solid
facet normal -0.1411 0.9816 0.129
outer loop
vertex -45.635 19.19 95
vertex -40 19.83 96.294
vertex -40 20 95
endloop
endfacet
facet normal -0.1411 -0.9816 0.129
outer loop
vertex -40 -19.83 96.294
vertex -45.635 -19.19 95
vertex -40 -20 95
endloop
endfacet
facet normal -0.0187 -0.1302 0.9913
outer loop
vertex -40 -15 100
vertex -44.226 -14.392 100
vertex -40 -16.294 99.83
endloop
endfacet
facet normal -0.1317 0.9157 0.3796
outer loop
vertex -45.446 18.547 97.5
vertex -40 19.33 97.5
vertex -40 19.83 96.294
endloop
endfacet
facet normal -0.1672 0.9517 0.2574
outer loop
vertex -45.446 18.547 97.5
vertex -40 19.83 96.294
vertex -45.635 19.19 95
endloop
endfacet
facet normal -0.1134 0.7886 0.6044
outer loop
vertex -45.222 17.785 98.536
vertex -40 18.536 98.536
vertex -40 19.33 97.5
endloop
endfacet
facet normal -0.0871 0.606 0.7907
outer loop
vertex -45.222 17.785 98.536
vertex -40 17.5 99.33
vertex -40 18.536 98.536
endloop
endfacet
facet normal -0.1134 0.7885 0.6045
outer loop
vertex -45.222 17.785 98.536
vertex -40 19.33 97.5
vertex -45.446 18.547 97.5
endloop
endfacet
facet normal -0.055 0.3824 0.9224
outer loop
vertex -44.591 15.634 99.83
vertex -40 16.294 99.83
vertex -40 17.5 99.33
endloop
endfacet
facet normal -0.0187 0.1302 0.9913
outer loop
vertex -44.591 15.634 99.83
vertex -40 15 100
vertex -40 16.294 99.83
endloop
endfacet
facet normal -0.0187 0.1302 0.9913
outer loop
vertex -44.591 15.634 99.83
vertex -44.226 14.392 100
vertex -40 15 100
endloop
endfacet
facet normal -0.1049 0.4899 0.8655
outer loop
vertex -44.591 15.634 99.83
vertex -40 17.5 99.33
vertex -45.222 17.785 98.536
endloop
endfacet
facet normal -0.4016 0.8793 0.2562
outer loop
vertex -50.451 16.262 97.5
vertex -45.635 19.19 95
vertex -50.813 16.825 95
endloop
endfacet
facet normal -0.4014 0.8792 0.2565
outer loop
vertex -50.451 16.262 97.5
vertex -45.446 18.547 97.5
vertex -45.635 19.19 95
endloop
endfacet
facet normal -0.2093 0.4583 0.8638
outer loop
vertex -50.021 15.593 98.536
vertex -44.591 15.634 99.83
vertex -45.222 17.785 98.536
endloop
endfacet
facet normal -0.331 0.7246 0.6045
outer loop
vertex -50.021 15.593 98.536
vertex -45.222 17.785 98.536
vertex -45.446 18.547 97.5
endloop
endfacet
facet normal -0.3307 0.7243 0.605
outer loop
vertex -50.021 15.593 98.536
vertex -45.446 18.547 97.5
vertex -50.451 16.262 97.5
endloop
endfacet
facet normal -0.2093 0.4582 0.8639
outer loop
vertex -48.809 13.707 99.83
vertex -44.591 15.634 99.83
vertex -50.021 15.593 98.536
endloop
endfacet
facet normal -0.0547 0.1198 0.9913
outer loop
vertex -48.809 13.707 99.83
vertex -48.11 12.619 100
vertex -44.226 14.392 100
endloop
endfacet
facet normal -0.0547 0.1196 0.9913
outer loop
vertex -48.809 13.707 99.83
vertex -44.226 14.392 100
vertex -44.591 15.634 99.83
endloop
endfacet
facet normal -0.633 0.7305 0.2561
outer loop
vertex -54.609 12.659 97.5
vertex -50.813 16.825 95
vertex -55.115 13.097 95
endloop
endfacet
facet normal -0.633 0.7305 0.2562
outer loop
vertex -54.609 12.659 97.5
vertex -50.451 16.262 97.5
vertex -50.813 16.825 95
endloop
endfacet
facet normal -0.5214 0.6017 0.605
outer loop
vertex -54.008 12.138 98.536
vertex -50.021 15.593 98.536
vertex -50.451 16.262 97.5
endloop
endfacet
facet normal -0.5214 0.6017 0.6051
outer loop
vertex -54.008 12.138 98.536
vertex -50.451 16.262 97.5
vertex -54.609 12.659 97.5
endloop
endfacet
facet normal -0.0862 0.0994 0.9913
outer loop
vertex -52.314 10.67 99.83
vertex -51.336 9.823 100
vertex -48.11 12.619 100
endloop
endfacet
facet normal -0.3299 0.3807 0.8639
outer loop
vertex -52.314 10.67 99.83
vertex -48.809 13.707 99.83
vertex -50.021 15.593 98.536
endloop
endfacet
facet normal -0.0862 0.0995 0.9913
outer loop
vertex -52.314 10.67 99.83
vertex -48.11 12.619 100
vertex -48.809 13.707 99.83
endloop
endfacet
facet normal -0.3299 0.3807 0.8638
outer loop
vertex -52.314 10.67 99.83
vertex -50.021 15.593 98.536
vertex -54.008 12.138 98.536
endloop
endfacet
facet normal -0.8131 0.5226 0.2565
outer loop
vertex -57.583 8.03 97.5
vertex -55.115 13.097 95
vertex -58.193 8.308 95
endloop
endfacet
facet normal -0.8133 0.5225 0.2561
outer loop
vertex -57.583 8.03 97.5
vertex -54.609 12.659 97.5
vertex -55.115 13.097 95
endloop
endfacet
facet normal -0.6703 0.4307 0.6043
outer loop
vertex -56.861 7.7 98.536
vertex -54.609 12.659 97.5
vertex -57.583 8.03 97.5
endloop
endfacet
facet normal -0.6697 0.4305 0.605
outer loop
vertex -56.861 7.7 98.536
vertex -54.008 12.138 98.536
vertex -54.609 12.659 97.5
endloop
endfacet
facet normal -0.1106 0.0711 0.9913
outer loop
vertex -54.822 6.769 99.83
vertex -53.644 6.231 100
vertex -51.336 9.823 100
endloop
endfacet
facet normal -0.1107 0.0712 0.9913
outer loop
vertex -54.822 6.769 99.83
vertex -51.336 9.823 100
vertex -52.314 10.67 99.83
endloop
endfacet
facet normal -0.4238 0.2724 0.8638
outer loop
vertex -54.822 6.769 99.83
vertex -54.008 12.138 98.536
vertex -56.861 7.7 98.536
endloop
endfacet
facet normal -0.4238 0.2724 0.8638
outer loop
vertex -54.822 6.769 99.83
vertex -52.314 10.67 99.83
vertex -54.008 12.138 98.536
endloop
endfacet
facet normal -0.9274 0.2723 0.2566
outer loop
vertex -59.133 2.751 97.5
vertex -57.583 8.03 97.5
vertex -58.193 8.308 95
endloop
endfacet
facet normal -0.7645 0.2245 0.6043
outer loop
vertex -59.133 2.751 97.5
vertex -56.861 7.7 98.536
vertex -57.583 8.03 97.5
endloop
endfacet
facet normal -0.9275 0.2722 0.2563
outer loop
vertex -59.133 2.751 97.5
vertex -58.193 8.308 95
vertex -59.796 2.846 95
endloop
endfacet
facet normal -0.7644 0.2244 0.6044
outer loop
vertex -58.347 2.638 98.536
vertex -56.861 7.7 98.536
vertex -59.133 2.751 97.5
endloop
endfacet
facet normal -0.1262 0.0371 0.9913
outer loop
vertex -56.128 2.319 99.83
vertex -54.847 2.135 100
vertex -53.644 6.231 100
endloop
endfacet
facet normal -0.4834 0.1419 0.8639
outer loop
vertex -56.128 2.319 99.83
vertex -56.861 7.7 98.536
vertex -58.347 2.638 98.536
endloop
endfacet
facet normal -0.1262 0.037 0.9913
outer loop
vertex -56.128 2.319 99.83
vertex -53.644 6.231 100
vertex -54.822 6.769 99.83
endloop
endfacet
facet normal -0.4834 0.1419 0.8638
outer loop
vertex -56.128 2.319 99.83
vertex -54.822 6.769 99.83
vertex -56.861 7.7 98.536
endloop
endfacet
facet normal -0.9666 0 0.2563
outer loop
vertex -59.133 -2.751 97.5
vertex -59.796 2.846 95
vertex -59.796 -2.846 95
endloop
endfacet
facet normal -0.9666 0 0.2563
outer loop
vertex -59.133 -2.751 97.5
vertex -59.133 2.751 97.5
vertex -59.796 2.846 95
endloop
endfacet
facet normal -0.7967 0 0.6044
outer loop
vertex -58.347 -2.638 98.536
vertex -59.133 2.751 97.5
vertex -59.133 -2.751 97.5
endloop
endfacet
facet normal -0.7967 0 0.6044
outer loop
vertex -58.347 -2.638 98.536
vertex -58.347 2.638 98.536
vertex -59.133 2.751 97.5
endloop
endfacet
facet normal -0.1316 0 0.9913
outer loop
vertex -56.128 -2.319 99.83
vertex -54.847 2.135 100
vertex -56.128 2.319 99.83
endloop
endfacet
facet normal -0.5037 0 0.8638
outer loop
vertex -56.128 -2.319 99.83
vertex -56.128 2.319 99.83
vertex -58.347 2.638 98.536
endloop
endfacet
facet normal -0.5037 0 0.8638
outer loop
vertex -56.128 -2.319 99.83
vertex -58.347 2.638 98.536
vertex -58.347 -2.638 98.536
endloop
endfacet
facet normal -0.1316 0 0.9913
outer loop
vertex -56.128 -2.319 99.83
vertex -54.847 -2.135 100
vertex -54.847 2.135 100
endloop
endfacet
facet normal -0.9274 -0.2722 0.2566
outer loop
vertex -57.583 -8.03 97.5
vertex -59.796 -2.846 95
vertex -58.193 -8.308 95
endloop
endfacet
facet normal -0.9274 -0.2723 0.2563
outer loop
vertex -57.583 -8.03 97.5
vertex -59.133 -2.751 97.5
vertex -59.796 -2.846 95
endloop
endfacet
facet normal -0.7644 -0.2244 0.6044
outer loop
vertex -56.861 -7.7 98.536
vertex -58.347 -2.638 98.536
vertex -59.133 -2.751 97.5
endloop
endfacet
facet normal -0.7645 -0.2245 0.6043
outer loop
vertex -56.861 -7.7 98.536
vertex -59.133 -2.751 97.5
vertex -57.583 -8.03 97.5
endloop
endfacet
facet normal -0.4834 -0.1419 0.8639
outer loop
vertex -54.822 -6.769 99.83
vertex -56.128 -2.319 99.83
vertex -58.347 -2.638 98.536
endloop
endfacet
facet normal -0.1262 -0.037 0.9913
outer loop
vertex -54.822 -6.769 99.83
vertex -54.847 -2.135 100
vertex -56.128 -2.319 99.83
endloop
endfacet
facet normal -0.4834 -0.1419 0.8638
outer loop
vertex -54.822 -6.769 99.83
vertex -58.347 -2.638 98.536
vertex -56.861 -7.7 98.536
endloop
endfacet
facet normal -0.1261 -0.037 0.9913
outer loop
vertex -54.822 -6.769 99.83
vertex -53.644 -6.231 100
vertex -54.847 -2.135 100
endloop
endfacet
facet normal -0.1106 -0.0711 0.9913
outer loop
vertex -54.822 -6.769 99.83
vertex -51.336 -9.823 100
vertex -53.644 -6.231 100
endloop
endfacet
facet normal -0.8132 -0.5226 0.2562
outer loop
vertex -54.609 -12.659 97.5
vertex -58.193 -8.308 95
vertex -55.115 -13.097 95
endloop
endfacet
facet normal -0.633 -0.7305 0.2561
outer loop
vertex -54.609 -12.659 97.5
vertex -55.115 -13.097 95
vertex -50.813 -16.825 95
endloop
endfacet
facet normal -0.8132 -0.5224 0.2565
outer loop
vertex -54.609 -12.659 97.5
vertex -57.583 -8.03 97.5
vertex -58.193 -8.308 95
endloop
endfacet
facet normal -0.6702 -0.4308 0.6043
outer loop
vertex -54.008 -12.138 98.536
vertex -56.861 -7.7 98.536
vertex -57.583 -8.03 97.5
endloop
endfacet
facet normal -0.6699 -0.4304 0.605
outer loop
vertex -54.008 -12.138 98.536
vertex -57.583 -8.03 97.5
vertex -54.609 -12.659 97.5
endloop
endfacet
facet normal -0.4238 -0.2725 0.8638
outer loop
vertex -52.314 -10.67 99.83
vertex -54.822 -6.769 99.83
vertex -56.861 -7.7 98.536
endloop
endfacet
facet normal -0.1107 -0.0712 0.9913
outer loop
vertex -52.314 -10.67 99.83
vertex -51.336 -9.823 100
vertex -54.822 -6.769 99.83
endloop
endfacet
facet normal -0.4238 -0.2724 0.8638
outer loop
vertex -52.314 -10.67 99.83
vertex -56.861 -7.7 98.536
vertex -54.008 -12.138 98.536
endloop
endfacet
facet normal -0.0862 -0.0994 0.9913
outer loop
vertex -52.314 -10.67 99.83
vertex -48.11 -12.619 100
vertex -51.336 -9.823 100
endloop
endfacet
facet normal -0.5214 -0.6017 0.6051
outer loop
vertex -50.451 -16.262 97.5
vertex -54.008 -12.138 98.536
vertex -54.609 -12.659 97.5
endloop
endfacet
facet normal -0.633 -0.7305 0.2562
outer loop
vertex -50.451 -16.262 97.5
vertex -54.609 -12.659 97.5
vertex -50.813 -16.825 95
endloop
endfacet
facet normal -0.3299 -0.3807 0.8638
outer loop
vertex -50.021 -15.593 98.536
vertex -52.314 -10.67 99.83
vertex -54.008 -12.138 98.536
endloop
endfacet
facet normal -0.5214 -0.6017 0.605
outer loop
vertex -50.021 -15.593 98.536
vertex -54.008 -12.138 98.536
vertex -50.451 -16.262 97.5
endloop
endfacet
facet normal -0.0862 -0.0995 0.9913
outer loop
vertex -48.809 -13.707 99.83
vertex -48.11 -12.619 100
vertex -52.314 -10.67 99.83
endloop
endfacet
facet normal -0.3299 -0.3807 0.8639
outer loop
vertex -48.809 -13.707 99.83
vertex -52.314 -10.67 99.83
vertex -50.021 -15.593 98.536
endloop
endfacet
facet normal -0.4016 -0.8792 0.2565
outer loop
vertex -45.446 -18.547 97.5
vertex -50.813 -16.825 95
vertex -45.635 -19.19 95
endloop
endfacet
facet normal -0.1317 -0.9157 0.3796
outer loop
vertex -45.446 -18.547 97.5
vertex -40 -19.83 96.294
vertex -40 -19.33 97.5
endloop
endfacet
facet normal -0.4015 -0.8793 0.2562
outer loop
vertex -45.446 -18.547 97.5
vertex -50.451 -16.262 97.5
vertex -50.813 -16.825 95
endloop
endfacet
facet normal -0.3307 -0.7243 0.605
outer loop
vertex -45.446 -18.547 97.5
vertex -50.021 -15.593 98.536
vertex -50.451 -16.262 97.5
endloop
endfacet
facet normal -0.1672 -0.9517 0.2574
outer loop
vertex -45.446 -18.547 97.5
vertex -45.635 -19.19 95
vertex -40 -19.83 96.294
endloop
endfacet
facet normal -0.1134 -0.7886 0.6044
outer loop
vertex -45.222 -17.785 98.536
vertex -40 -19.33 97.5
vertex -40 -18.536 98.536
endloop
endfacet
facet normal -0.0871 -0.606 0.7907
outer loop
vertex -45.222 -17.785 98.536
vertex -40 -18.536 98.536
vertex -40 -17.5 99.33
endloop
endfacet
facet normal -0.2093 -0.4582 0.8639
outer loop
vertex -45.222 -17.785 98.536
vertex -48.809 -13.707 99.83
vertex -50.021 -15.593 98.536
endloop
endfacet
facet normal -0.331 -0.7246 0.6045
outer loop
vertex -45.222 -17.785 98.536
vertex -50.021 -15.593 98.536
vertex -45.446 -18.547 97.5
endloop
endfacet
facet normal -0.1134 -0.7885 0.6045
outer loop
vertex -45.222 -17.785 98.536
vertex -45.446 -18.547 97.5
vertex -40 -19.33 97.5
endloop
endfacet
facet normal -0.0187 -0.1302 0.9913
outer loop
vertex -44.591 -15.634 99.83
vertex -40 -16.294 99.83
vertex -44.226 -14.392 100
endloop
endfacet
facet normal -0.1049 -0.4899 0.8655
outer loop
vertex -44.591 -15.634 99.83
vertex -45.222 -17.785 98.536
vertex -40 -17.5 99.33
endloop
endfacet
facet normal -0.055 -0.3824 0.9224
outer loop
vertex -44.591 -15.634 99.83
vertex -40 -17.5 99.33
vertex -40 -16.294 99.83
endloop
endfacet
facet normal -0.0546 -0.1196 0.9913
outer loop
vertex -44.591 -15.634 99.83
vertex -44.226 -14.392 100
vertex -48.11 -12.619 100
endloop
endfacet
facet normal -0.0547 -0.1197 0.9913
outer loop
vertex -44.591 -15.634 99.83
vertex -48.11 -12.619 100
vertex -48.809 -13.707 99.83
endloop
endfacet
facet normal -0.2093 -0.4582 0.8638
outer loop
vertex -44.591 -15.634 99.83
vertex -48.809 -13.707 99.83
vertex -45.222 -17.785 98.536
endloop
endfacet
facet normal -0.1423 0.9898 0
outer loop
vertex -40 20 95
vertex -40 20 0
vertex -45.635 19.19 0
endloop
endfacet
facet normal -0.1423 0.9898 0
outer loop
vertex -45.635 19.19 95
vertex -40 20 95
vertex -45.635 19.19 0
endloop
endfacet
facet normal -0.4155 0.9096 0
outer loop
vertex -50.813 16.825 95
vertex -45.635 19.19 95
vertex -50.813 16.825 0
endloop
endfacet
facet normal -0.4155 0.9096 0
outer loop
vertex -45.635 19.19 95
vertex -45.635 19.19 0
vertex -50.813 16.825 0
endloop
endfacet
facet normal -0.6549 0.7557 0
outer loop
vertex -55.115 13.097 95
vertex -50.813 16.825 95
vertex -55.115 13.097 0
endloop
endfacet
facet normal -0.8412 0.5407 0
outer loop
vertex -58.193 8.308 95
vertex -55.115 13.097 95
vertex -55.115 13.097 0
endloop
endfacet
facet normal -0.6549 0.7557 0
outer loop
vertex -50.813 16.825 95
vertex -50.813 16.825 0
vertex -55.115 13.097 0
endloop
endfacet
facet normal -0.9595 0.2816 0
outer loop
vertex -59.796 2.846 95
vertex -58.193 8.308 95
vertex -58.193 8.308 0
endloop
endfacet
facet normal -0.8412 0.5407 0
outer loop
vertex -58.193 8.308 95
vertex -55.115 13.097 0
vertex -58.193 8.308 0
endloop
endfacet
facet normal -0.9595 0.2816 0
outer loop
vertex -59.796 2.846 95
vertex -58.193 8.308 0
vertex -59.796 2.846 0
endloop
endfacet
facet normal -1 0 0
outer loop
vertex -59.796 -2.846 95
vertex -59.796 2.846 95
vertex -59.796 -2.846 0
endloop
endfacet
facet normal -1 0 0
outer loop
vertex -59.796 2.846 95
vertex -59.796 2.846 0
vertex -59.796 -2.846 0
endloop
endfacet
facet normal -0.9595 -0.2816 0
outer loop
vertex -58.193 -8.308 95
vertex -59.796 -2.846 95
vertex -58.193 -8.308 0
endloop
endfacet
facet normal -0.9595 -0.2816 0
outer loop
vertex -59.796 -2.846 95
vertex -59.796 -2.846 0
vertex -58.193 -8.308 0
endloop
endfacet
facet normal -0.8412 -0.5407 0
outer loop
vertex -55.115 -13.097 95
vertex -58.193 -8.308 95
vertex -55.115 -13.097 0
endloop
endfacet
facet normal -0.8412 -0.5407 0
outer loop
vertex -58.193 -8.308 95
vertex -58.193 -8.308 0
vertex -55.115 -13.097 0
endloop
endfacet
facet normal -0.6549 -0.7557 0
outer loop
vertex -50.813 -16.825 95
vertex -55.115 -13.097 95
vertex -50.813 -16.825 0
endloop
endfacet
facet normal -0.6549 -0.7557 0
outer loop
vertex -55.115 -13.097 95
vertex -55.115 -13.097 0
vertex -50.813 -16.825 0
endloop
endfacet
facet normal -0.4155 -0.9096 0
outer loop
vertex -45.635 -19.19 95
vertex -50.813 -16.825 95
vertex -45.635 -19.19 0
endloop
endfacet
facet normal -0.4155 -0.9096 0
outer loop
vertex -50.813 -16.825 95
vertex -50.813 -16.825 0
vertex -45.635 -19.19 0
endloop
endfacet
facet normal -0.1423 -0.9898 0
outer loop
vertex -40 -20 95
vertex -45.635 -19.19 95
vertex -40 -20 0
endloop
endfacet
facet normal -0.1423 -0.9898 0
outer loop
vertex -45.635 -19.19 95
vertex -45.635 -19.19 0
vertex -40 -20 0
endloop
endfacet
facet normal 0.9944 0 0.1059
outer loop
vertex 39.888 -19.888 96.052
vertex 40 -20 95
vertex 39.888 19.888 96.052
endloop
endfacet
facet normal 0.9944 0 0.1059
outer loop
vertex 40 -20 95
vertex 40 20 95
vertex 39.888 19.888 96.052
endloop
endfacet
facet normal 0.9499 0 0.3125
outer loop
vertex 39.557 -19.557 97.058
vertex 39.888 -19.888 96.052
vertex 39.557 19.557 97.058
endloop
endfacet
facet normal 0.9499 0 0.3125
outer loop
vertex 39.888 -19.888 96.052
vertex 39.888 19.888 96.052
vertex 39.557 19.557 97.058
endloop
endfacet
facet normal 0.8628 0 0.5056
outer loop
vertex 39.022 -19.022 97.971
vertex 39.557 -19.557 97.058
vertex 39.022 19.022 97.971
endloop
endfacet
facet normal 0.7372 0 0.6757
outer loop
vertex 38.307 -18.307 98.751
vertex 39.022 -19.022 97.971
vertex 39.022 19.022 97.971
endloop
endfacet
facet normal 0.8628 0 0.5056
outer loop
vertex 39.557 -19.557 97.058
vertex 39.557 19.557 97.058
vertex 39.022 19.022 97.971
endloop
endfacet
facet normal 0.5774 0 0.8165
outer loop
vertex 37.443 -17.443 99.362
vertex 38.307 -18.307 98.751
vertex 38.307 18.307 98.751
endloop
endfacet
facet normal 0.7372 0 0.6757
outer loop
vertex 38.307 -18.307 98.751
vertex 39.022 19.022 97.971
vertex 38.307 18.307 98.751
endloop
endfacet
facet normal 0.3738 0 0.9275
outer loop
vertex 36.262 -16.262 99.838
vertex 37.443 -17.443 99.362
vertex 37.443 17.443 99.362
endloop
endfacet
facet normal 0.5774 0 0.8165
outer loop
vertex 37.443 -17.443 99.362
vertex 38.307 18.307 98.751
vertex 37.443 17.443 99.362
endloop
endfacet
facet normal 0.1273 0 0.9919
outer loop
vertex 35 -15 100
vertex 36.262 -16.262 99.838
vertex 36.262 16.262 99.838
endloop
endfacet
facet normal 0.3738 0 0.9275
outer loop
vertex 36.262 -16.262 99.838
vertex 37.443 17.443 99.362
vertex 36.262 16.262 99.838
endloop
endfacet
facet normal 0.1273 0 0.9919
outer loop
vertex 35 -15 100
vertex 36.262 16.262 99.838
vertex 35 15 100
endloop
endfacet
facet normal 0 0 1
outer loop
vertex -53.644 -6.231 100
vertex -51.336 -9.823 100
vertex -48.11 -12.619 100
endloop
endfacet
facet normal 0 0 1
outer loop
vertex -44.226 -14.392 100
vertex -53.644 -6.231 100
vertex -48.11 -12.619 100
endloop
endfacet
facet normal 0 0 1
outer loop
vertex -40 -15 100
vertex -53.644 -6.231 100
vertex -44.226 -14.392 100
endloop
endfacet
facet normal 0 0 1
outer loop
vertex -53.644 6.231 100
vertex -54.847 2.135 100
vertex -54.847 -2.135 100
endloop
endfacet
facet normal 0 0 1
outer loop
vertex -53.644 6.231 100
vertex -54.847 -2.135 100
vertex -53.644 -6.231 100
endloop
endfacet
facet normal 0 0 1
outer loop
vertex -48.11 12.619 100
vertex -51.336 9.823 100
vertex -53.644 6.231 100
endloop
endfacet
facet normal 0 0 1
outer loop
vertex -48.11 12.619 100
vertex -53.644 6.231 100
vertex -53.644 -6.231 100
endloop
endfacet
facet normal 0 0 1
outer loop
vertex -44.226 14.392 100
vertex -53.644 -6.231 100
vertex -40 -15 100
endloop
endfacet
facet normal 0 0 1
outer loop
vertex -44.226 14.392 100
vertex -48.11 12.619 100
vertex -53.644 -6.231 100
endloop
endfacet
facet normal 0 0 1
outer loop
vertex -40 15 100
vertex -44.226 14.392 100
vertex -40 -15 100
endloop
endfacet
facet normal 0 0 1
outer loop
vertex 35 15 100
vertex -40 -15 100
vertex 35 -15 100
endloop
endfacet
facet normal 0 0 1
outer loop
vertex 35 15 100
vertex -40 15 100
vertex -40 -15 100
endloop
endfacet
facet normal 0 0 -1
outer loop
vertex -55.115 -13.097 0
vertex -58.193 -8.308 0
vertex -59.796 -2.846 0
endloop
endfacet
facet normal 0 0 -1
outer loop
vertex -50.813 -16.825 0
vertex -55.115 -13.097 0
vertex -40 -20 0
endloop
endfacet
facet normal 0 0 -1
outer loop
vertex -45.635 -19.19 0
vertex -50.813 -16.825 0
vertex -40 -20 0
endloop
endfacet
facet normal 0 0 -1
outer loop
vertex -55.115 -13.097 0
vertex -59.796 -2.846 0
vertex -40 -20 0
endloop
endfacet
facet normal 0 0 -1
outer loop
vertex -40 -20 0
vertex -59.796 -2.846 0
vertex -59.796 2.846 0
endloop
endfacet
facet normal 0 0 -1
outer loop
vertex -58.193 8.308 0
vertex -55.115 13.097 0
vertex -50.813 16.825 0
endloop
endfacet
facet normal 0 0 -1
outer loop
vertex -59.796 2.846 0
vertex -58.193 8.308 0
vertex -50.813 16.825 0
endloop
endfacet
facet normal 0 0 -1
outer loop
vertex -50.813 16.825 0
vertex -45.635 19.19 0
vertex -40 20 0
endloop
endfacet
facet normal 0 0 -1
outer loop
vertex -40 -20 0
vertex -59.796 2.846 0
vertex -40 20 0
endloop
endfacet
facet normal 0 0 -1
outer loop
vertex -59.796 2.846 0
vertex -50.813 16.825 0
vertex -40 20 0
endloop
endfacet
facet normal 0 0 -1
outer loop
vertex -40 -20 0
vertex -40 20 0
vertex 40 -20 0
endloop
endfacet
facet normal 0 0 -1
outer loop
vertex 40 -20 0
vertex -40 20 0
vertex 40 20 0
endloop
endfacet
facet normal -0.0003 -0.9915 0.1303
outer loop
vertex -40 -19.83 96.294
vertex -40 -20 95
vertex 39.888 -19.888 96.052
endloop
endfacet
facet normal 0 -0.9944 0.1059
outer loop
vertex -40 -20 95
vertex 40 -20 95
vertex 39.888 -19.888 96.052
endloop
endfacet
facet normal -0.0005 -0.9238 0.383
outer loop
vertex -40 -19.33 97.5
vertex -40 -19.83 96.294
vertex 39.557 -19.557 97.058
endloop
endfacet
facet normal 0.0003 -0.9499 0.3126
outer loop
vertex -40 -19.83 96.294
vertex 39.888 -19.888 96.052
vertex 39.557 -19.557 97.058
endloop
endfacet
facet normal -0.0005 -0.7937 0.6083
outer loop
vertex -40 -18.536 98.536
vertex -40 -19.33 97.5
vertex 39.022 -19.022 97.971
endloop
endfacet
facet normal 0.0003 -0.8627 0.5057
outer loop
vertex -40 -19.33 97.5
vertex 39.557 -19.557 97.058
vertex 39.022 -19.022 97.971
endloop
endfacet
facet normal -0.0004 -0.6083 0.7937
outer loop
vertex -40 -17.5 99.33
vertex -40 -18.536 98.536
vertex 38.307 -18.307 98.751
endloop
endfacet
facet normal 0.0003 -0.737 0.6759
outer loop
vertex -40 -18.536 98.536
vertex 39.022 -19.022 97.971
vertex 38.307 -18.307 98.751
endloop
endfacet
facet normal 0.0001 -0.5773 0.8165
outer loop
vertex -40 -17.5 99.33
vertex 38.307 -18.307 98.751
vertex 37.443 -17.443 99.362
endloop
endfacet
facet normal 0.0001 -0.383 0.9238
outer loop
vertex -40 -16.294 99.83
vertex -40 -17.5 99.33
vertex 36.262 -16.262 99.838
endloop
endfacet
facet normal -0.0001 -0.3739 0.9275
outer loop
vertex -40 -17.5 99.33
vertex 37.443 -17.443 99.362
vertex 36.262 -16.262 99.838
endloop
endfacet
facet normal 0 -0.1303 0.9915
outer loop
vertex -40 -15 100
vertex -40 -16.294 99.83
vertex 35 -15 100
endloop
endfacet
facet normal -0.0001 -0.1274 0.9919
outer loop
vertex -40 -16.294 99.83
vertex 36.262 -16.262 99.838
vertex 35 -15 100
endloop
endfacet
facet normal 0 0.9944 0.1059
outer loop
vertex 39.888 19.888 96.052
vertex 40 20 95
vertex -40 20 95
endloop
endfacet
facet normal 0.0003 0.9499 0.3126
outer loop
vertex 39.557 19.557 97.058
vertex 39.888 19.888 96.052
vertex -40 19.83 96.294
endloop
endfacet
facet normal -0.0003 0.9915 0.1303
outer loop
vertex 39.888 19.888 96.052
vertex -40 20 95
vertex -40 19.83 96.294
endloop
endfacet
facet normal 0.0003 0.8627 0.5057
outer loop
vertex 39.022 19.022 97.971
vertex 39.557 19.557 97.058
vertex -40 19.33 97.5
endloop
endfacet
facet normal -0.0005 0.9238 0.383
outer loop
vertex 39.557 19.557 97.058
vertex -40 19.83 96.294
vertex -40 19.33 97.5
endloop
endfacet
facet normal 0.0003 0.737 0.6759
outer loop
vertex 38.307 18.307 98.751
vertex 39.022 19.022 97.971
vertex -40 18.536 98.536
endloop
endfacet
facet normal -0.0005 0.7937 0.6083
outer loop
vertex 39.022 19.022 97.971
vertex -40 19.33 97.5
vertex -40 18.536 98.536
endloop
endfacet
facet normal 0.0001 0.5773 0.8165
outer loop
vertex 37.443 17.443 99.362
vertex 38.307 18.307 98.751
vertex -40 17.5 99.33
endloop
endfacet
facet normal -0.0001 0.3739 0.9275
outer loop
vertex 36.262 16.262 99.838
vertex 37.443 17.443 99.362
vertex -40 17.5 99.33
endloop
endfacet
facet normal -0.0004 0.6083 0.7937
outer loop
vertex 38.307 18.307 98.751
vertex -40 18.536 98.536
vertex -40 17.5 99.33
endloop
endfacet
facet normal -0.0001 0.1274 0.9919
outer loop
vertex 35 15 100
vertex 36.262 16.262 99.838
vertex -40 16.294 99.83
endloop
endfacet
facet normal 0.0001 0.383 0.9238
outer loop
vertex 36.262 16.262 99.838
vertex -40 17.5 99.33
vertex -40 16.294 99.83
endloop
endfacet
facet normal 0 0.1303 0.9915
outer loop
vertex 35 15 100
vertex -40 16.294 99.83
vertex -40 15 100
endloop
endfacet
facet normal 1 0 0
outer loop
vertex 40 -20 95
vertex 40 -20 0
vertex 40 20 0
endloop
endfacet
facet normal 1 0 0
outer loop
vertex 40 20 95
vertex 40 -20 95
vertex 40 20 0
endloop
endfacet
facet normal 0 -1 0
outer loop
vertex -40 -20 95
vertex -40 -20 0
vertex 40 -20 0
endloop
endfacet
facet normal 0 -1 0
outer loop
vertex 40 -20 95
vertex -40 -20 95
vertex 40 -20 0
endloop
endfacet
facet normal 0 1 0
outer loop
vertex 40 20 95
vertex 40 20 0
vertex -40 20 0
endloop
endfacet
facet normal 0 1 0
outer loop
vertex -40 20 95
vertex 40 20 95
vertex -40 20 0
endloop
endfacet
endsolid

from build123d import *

# Parameters (mm, degrees)
F1_DEPTH = 100
F2_R     = 5


with BuildPart() as f1:
    # F0 (on Top) → F1 (new body)
    with BuildSketch(Plane.XY):
        with BuildLine():
            Line((40, 20), (-40, 20))
            ThreePointArc((-40, 20), (-60, 0), (-40, -20))
            Line((-40, -20), (40, -20))
            Line((40, -20), (40, 20))
        make_face()
    extrude(amount=F1_DEPTH)

    # F2
    f2_edges = [f1.edges().sort_by_distance(p)[0] for p in [
        (0, 20, 100),
        (40, 0, 100),
    ]]
    fillet(f2_edges, radius=F2_R)


solid = f1.part
